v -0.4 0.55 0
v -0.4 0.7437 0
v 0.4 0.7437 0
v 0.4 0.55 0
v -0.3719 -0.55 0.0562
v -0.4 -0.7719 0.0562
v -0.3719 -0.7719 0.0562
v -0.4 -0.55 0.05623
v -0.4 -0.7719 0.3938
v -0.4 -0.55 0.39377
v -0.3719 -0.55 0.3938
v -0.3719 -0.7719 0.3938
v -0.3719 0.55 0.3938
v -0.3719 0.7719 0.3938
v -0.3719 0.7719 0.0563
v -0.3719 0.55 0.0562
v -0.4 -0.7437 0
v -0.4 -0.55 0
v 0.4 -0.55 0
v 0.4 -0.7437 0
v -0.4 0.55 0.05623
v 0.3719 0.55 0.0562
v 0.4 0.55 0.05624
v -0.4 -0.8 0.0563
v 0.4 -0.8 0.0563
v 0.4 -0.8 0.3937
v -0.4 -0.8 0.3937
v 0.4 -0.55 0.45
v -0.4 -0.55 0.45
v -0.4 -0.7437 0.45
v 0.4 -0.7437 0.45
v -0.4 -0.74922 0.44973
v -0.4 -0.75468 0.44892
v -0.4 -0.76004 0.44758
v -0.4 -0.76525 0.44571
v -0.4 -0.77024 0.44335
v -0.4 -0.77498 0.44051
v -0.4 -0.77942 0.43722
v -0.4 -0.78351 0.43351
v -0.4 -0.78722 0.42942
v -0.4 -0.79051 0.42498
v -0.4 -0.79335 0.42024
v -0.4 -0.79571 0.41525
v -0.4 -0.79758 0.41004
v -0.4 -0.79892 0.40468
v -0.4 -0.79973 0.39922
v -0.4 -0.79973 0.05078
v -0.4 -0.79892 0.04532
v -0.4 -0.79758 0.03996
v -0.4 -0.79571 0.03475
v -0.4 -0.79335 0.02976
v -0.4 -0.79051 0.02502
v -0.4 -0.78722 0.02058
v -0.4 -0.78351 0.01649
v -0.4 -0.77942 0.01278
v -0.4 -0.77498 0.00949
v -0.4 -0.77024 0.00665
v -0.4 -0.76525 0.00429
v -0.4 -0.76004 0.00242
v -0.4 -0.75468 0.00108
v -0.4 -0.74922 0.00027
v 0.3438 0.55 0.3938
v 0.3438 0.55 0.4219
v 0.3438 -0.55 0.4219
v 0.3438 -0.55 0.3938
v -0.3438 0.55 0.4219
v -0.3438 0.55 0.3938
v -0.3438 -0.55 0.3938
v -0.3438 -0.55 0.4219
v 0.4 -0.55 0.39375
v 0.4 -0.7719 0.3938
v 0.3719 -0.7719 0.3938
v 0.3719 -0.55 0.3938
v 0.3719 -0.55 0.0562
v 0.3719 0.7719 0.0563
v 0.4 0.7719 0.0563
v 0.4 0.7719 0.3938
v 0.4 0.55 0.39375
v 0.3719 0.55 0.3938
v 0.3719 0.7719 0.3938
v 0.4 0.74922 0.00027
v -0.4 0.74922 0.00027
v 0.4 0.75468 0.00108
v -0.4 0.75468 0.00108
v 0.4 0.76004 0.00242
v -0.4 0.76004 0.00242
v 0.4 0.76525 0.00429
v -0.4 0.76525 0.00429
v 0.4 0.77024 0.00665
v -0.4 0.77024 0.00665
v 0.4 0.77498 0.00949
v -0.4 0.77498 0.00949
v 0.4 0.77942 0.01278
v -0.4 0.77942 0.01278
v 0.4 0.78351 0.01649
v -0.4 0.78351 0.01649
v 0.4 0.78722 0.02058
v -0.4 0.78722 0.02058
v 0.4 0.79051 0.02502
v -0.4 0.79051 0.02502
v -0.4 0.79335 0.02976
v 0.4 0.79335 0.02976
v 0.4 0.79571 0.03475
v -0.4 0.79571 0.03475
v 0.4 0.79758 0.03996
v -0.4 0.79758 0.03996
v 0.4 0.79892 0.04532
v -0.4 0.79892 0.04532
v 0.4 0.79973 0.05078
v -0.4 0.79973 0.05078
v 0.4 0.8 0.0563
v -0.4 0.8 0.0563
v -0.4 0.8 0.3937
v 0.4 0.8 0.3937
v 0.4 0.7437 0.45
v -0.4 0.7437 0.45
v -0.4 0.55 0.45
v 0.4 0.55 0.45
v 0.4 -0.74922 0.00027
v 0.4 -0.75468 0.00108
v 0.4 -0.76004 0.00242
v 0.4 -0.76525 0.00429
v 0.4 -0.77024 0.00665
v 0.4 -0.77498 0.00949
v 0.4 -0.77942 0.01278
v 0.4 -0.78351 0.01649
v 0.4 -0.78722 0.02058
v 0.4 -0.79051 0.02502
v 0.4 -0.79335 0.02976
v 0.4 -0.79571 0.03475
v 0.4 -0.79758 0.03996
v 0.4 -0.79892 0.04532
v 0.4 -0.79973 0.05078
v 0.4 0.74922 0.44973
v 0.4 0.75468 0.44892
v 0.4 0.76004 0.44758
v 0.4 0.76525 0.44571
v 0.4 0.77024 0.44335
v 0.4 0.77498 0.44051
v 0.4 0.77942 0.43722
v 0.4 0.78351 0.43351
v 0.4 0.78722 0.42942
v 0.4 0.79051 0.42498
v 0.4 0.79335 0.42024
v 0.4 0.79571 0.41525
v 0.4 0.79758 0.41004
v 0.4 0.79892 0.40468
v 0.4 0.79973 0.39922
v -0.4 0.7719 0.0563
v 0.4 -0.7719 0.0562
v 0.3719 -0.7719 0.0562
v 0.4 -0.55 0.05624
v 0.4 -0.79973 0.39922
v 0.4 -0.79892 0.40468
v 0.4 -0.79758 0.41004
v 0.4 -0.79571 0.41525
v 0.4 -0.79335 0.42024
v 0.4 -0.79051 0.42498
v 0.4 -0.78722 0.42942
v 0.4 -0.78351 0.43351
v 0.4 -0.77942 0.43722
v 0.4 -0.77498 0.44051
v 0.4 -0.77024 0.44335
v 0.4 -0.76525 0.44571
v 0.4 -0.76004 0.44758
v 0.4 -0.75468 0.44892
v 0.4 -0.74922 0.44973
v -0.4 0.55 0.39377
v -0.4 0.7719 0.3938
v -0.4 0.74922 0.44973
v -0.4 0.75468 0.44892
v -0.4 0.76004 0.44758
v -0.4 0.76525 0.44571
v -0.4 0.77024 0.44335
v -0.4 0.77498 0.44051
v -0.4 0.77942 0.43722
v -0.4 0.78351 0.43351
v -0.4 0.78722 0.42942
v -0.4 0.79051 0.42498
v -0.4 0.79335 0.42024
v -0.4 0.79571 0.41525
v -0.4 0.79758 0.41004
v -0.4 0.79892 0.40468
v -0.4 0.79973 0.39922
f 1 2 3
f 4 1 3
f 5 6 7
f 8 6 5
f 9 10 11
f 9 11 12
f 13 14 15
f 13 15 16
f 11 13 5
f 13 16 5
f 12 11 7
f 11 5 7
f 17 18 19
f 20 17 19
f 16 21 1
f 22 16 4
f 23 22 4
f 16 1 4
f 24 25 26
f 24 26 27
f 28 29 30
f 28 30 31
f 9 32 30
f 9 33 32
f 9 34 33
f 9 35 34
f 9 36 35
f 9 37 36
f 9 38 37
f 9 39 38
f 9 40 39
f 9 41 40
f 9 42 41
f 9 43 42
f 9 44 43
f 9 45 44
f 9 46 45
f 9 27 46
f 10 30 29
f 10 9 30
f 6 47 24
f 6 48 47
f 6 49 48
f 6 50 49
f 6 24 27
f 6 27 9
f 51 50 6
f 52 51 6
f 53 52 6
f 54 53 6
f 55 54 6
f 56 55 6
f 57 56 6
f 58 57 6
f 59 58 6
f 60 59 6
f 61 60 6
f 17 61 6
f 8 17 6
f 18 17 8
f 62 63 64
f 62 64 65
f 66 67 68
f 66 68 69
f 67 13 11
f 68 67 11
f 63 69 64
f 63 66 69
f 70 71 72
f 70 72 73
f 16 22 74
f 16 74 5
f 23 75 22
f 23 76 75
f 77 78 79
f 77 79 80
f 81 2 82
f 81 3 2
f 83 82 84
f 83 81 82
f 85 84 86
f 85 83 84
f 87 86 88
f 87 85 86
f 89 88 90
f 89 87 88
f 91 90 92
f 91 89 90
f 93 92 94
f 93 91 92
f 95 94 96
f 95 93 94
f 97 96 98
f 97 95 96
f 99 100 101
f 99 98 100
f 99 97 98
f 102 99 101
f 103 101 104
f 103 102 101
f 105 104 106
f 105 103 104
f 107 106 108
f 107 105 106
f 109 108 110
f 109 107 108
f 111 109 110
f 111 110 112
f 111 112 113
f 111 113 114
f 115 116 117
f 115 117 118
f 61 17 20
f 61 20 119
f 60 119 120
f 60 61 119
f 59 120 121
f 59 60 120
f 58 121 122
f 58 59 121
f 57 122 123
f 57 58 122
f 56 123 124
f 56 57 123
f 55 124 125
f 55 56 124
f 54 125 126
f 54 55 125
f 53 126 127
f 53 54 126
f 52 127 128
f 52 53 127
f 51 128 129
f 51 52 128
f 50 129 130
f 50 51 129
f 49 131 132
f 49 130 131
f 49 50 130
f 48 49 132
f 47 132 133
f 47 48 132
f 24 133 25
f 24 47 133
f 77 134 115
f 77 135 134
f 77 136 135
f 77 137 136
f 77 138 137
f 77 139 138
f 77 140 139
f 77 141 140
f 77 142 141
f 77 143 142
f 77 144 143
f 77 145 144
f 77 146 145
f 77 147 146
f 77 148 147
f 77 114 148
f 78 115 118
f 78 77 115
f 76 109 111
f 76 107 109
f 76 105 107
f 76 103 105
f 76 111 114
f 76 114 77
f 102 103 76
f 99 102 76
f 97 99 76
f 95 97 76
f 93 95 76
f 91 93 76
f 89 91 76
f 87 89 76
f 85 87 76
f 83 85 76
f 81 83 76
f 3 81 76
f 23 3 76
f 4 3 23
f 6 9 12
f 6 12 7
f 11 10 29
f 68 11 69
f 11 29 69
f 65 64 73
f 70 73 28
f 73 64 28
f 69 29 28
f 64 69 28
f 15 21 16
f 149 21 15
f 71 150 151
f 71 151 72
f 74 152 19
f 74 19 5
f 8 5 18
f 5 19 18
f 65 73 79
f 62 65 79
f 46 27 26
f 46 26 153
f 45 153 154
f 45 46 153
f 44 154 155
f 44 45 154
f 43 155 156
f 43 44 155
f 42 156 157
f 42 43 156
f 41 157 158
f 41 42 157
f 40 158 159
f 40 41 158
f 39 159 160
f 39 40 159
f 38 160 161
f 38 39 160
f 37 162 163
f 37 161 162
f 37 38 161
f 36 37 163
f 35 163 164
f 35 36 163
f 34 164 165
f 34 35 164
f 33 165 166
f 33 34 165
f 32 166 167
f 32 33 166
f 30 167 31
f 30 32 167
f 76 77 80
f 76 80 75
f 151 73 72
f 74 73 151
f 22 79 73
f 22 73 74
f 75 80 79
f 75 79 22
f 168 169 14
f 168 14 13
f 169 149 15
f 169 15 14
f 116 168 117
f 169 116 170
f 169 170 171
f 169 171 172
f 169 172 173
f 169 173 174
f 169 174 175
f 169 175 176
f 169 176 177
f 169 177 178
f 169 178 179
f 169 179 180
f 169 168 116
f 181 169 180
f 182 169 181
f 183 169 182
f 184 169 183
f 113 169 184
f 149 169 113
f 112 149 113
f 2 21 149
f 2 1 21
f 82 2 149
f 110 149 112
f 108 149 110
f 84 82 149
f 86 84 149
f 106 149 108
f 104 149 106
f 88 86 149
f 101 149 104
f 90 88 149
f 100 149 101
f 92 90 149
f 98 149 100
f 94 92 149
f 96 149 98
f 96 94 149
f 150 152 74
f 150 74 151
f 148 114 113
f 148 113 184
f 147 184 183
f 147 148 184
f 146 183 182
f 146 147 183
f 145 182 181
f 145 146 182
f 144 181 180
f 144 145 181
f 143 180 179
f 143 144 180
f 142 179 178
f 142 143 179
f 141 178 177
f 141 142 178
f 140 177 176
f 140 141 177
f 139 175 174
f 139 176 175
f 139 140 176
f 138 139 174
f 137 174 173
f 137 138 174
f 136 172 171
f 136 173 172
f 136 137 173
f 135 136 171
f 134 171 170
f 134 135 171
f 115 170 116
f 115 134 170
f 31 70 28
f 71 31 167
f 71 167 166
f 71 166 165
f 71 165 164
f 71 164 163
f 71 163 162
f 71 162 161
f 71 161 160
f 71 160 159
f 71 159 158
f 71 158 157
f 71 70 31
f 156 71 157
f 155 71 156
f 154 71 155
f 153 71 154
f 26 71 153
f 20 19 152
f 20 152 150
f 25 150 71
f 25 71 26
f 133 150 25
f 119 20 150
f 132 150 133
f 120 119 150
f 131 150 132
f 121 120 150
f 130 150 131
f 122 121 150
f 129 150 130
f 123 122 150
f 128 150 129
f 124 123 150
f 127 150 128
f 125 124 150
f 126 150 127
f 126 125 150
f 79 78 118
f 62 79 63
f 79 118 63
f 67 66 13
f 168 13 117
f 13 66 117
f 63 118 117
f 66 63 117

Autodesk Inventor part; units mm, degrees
ref_plane "YZ Plane" through (0, 0, 0) normal (1, 0, 0) x (0, 1, 0)
ref_plane "XZ Plane" through (0, 0, 0) normal (0, 1, 0) x (-1, 0, 0)
ref_plane "XY Plane" through (0, 0, 0) normal (0, 0, 1) x (1, 0, 0)
sketch "Sketch1" plane through (0, 0, 0) normal (0, 0, 1) x (1, 0, 0)
  line L0 (0.4, -0.8) -> (-0.4, -0.8)
  line L1 (-0.4, -0.8) -> (-0.4, 0.8)
  line L2 (-0.4, 0.8) -> (0.4, 0.8)
  line L3 (0.4, 0.8) -> (0.4, -0.8)
  line L4 (0.4, -0.8) -> (-0.4, 0.8) construction
  line L5 (-0.4, -0.8) -> (0.4, 0.8) construction
  point P0 (0, 0)
  dimension "d0" = 0.8
  dimension "d1" = 1.6
extrude "Extrusion1" add sketch "Sketch1" along normal blind 0.45
sketch "Sketch2" plane through (0, 0, 0) normal (0, 0, -1) x (-1, 0, 0)
  line L0 (-0.4, -0.8) -> (0.4, -0.8) projected
  line L1 (0.4, -0.8) -> (0.4, 0.8) projected
  line L2 (0.4, 0.8) -> (-0.4, 0.8) projected
  line L3 (-0.4, 0.8) -> (-0.4, -0.8) projected
  line L4 (-0.4, -0.55) -> (0.4, -0.55)
  line L5 (0.4, 0.8) -> (0.4, -0.8) projected
  line L6 (0.4, 0.55) -> (-0.4, 0.55)
  point P0 (0, 0)
  dimension "d4" = 0.25
  dimension "d5" = 0.25
extrude "Extrusion2" cut sketch "Sketch2" against normal blind 0.0563 contours L3 L6 L1 L4
sketch "Sketch3" plane through (0, 0, 0.45) normal (0, 0, 1) x (1, 0, 0)
  line L0 (-0.4, -0.8) -> (0.4, -0.8) projected
  line L1 (0.4, -0.8) -> (0.4, 0.8) projected
  line L2 (0.4, 0.8) -> (-0.4, 0.8) projected
  line L3 (-0.4, 0.8) -> (-0.4, -0.8) projected
  line L4 (-0.4, 0.55) -> (-0.4, -0.55) projected
  line L5 (-0.4, -0.8) -> (-0.4, 0.8) projected
  line L6 (0.4, 0.8) -> (-0.4, 0.8) projected
  line L7 (0.4, 0.55) -> (-0.4, 0.55)
  line L8 (-0.4, 0.55) -> (-0.4, -0.55)
  line L9 (-0.4, -0.55) -> (0.4, -0.55)
  line L10 (0.4, -0.55) -> (0.4, 0.55)
  line L11 (0.4, 0.55) -> (-0.4, -0.55) construction
  line L12 (-0.4, 0.55) -> (0.4, -0.55) construction
  point P0 (0, 0)
  dimension "d22" = 0.25
extrude "Extrusion7" cut sketch "Sketch3" against normal blind 0.0563 contours L3 L7 L1 L9
sketch "Sketch4" plane through (0.4, -0.8, 0.45) normal (1, 0, 0) x (0, 0, -1)
  line L0 (0, 0) -> (0, 0.25) projected
  line L1 (0.45, 0) -> (0, 0) projected
  line L2 (0.45, 0.25) -> (0.45, 0) projected
  line L3 (0.45, 1.6) -> (0, 1.6) projected
  line L4 (0.45, 0.25) -> (0.3938, 0.25) projected
  line L5 (0.3938, 0.25) -> (0.3938, 1.35) projected
  line L6 (0.3938, 1.35) -> (0.45, 1.35) projected
  line L7 (0.45, 1.6) -> (0.45, 1.35) projected
  line L8 (0.0562, 0.25) -> (0, 0.25) projected
  line L9 (0, 1.35) -> (0.0562, 1.35) projected
  line L10 (0.0562, 1.35) -> (0.0562, 0.25) projected
  line L11 (0.3938, 0.0281) -> (0.0562, 0.0281)
  line L12 (0.0562, 0.0281) -> (0.0562, 1.5719)
  line L13 (0.0562, 1.5719) -> (0.3937, 1.5719)
  line L14 (0.3937, 1.5719) -> (0.3938, 0.0281)
  line L15 (0.3938, 0.0281) -> (0.0562, 1.5719) construction
  line L16 (0.0562, 0.0281) -> (0.3937, 1.5719) construction
  line L17 (0, 1.35) -> (0, 1.6) projected
  point P0 (0.225, 0.8)
  dimension "d25" = 0.0281
  dimension "d26" = 0.0281
extrude "Extrusion8" cut sketch "Sketch4" against normal blind 0.0281 contours L10 L12 L13 L14 L5 L11
mirror "Mirror1" about plane through (0, 0, 0) normal (1, 0, 0) of "Extrusion8"
sketch "Sketch7" plane through (0, 0, 0.3938) normal (0, 0, 1) x (1, 0, 0)
  line L0 (-0.3719, 0.55) -> (-0.3719, -0.55) projected
  line L1 (0.3719, -0.55) -> (-0.3719, -0.55) projected
  line L2 (0.3719, -0.55) -> (0.3719, 0.55) projected
  line L3 (-0.3719, 0.55) -> (0.3719, 0.55) projected
  point P0 (0, 0)
extrude "Extrusion9" add sketch "Sketch7" along normal blind 0.0281
sketch "Sketch8" plane through (0.3719, -0.8, 0.45) normal (1, 0, 0) x (0, 0, -1)
  line L0 (0.3938, 0.0281) -> (0.0562, 0.0281) projected
  line L1 (0.3938, 0.25) -> (0.3938, 0.0281) projected
  line L2 (0.3937, 1.35) -> (0.3938, 0.25) projected
  line L3 (0.3937, 1.5719) -> (0.3937, 1.35) projected
  line L4 (0.0562, 1.5719) -> (0.3937, 1.5719) projected
  line L5 (0.0562, 1.35) -> (0.0562, 1.5719) projected
  line L6 (0.0281, 1.35) -> (0.0562, 1.35) projected
  line L7 (0.0281, 0.25) -> (0.0281, 1.35) projected
  line L8 (0.0562, 0.25) -> (0.0281, 0.25) projected
  line L9 (0.0562, 0.0281) -> (0.0562, 0.25) projected
  line L10 (0.0562, 0.25) -> (0.0562, 1.35)
  point P0 (0.45, 0.8)
extrude "Extrusion10" cut sketch "Sketch8" against normal blind 0.0281 contours L8 L7 L6 L10
mirror "Mirror2" about plane through (0, 0, 0) normal (1, 0, 0) of "Extrusion10"
fillet "Fillet1" radius 0.0563 4 edges at (0, -0.8, 0.45) (0, 0.8, 0.45) (0, 0.8, 0) (0, -0.8, 0)
equation "\"d0\" = width"
equation "\"d1\" = length"
equation "\"d2\" = height"
equation "\"d4\" = i2"
equation "\"d5\" = i2"
equation "\"d6\" = 0.125 * height"
equation "\"d22\" = i1"
equation "\"d23\" = 0.125 * height"
equation "\"d25\" = 0.0625 * height"
equation "\"d26\" = 0.0625 * height"
equation "\"d27\" = 0.0625 * height"
equation "\"d29\" = 0.0625 * height"
equation "\"d31\" = 0.0625 * height"
equation "\"d21\" = 0.125 * height"
equation "\"length\" = 1.6"
equation "\"width\" = 0.8"
equation "\"height\" = 0.45"
equation "\"i1\" = 0.25"
equation "\"i2\" = 0.25"
properties part number "RC0603" material "ABS Plastic"
